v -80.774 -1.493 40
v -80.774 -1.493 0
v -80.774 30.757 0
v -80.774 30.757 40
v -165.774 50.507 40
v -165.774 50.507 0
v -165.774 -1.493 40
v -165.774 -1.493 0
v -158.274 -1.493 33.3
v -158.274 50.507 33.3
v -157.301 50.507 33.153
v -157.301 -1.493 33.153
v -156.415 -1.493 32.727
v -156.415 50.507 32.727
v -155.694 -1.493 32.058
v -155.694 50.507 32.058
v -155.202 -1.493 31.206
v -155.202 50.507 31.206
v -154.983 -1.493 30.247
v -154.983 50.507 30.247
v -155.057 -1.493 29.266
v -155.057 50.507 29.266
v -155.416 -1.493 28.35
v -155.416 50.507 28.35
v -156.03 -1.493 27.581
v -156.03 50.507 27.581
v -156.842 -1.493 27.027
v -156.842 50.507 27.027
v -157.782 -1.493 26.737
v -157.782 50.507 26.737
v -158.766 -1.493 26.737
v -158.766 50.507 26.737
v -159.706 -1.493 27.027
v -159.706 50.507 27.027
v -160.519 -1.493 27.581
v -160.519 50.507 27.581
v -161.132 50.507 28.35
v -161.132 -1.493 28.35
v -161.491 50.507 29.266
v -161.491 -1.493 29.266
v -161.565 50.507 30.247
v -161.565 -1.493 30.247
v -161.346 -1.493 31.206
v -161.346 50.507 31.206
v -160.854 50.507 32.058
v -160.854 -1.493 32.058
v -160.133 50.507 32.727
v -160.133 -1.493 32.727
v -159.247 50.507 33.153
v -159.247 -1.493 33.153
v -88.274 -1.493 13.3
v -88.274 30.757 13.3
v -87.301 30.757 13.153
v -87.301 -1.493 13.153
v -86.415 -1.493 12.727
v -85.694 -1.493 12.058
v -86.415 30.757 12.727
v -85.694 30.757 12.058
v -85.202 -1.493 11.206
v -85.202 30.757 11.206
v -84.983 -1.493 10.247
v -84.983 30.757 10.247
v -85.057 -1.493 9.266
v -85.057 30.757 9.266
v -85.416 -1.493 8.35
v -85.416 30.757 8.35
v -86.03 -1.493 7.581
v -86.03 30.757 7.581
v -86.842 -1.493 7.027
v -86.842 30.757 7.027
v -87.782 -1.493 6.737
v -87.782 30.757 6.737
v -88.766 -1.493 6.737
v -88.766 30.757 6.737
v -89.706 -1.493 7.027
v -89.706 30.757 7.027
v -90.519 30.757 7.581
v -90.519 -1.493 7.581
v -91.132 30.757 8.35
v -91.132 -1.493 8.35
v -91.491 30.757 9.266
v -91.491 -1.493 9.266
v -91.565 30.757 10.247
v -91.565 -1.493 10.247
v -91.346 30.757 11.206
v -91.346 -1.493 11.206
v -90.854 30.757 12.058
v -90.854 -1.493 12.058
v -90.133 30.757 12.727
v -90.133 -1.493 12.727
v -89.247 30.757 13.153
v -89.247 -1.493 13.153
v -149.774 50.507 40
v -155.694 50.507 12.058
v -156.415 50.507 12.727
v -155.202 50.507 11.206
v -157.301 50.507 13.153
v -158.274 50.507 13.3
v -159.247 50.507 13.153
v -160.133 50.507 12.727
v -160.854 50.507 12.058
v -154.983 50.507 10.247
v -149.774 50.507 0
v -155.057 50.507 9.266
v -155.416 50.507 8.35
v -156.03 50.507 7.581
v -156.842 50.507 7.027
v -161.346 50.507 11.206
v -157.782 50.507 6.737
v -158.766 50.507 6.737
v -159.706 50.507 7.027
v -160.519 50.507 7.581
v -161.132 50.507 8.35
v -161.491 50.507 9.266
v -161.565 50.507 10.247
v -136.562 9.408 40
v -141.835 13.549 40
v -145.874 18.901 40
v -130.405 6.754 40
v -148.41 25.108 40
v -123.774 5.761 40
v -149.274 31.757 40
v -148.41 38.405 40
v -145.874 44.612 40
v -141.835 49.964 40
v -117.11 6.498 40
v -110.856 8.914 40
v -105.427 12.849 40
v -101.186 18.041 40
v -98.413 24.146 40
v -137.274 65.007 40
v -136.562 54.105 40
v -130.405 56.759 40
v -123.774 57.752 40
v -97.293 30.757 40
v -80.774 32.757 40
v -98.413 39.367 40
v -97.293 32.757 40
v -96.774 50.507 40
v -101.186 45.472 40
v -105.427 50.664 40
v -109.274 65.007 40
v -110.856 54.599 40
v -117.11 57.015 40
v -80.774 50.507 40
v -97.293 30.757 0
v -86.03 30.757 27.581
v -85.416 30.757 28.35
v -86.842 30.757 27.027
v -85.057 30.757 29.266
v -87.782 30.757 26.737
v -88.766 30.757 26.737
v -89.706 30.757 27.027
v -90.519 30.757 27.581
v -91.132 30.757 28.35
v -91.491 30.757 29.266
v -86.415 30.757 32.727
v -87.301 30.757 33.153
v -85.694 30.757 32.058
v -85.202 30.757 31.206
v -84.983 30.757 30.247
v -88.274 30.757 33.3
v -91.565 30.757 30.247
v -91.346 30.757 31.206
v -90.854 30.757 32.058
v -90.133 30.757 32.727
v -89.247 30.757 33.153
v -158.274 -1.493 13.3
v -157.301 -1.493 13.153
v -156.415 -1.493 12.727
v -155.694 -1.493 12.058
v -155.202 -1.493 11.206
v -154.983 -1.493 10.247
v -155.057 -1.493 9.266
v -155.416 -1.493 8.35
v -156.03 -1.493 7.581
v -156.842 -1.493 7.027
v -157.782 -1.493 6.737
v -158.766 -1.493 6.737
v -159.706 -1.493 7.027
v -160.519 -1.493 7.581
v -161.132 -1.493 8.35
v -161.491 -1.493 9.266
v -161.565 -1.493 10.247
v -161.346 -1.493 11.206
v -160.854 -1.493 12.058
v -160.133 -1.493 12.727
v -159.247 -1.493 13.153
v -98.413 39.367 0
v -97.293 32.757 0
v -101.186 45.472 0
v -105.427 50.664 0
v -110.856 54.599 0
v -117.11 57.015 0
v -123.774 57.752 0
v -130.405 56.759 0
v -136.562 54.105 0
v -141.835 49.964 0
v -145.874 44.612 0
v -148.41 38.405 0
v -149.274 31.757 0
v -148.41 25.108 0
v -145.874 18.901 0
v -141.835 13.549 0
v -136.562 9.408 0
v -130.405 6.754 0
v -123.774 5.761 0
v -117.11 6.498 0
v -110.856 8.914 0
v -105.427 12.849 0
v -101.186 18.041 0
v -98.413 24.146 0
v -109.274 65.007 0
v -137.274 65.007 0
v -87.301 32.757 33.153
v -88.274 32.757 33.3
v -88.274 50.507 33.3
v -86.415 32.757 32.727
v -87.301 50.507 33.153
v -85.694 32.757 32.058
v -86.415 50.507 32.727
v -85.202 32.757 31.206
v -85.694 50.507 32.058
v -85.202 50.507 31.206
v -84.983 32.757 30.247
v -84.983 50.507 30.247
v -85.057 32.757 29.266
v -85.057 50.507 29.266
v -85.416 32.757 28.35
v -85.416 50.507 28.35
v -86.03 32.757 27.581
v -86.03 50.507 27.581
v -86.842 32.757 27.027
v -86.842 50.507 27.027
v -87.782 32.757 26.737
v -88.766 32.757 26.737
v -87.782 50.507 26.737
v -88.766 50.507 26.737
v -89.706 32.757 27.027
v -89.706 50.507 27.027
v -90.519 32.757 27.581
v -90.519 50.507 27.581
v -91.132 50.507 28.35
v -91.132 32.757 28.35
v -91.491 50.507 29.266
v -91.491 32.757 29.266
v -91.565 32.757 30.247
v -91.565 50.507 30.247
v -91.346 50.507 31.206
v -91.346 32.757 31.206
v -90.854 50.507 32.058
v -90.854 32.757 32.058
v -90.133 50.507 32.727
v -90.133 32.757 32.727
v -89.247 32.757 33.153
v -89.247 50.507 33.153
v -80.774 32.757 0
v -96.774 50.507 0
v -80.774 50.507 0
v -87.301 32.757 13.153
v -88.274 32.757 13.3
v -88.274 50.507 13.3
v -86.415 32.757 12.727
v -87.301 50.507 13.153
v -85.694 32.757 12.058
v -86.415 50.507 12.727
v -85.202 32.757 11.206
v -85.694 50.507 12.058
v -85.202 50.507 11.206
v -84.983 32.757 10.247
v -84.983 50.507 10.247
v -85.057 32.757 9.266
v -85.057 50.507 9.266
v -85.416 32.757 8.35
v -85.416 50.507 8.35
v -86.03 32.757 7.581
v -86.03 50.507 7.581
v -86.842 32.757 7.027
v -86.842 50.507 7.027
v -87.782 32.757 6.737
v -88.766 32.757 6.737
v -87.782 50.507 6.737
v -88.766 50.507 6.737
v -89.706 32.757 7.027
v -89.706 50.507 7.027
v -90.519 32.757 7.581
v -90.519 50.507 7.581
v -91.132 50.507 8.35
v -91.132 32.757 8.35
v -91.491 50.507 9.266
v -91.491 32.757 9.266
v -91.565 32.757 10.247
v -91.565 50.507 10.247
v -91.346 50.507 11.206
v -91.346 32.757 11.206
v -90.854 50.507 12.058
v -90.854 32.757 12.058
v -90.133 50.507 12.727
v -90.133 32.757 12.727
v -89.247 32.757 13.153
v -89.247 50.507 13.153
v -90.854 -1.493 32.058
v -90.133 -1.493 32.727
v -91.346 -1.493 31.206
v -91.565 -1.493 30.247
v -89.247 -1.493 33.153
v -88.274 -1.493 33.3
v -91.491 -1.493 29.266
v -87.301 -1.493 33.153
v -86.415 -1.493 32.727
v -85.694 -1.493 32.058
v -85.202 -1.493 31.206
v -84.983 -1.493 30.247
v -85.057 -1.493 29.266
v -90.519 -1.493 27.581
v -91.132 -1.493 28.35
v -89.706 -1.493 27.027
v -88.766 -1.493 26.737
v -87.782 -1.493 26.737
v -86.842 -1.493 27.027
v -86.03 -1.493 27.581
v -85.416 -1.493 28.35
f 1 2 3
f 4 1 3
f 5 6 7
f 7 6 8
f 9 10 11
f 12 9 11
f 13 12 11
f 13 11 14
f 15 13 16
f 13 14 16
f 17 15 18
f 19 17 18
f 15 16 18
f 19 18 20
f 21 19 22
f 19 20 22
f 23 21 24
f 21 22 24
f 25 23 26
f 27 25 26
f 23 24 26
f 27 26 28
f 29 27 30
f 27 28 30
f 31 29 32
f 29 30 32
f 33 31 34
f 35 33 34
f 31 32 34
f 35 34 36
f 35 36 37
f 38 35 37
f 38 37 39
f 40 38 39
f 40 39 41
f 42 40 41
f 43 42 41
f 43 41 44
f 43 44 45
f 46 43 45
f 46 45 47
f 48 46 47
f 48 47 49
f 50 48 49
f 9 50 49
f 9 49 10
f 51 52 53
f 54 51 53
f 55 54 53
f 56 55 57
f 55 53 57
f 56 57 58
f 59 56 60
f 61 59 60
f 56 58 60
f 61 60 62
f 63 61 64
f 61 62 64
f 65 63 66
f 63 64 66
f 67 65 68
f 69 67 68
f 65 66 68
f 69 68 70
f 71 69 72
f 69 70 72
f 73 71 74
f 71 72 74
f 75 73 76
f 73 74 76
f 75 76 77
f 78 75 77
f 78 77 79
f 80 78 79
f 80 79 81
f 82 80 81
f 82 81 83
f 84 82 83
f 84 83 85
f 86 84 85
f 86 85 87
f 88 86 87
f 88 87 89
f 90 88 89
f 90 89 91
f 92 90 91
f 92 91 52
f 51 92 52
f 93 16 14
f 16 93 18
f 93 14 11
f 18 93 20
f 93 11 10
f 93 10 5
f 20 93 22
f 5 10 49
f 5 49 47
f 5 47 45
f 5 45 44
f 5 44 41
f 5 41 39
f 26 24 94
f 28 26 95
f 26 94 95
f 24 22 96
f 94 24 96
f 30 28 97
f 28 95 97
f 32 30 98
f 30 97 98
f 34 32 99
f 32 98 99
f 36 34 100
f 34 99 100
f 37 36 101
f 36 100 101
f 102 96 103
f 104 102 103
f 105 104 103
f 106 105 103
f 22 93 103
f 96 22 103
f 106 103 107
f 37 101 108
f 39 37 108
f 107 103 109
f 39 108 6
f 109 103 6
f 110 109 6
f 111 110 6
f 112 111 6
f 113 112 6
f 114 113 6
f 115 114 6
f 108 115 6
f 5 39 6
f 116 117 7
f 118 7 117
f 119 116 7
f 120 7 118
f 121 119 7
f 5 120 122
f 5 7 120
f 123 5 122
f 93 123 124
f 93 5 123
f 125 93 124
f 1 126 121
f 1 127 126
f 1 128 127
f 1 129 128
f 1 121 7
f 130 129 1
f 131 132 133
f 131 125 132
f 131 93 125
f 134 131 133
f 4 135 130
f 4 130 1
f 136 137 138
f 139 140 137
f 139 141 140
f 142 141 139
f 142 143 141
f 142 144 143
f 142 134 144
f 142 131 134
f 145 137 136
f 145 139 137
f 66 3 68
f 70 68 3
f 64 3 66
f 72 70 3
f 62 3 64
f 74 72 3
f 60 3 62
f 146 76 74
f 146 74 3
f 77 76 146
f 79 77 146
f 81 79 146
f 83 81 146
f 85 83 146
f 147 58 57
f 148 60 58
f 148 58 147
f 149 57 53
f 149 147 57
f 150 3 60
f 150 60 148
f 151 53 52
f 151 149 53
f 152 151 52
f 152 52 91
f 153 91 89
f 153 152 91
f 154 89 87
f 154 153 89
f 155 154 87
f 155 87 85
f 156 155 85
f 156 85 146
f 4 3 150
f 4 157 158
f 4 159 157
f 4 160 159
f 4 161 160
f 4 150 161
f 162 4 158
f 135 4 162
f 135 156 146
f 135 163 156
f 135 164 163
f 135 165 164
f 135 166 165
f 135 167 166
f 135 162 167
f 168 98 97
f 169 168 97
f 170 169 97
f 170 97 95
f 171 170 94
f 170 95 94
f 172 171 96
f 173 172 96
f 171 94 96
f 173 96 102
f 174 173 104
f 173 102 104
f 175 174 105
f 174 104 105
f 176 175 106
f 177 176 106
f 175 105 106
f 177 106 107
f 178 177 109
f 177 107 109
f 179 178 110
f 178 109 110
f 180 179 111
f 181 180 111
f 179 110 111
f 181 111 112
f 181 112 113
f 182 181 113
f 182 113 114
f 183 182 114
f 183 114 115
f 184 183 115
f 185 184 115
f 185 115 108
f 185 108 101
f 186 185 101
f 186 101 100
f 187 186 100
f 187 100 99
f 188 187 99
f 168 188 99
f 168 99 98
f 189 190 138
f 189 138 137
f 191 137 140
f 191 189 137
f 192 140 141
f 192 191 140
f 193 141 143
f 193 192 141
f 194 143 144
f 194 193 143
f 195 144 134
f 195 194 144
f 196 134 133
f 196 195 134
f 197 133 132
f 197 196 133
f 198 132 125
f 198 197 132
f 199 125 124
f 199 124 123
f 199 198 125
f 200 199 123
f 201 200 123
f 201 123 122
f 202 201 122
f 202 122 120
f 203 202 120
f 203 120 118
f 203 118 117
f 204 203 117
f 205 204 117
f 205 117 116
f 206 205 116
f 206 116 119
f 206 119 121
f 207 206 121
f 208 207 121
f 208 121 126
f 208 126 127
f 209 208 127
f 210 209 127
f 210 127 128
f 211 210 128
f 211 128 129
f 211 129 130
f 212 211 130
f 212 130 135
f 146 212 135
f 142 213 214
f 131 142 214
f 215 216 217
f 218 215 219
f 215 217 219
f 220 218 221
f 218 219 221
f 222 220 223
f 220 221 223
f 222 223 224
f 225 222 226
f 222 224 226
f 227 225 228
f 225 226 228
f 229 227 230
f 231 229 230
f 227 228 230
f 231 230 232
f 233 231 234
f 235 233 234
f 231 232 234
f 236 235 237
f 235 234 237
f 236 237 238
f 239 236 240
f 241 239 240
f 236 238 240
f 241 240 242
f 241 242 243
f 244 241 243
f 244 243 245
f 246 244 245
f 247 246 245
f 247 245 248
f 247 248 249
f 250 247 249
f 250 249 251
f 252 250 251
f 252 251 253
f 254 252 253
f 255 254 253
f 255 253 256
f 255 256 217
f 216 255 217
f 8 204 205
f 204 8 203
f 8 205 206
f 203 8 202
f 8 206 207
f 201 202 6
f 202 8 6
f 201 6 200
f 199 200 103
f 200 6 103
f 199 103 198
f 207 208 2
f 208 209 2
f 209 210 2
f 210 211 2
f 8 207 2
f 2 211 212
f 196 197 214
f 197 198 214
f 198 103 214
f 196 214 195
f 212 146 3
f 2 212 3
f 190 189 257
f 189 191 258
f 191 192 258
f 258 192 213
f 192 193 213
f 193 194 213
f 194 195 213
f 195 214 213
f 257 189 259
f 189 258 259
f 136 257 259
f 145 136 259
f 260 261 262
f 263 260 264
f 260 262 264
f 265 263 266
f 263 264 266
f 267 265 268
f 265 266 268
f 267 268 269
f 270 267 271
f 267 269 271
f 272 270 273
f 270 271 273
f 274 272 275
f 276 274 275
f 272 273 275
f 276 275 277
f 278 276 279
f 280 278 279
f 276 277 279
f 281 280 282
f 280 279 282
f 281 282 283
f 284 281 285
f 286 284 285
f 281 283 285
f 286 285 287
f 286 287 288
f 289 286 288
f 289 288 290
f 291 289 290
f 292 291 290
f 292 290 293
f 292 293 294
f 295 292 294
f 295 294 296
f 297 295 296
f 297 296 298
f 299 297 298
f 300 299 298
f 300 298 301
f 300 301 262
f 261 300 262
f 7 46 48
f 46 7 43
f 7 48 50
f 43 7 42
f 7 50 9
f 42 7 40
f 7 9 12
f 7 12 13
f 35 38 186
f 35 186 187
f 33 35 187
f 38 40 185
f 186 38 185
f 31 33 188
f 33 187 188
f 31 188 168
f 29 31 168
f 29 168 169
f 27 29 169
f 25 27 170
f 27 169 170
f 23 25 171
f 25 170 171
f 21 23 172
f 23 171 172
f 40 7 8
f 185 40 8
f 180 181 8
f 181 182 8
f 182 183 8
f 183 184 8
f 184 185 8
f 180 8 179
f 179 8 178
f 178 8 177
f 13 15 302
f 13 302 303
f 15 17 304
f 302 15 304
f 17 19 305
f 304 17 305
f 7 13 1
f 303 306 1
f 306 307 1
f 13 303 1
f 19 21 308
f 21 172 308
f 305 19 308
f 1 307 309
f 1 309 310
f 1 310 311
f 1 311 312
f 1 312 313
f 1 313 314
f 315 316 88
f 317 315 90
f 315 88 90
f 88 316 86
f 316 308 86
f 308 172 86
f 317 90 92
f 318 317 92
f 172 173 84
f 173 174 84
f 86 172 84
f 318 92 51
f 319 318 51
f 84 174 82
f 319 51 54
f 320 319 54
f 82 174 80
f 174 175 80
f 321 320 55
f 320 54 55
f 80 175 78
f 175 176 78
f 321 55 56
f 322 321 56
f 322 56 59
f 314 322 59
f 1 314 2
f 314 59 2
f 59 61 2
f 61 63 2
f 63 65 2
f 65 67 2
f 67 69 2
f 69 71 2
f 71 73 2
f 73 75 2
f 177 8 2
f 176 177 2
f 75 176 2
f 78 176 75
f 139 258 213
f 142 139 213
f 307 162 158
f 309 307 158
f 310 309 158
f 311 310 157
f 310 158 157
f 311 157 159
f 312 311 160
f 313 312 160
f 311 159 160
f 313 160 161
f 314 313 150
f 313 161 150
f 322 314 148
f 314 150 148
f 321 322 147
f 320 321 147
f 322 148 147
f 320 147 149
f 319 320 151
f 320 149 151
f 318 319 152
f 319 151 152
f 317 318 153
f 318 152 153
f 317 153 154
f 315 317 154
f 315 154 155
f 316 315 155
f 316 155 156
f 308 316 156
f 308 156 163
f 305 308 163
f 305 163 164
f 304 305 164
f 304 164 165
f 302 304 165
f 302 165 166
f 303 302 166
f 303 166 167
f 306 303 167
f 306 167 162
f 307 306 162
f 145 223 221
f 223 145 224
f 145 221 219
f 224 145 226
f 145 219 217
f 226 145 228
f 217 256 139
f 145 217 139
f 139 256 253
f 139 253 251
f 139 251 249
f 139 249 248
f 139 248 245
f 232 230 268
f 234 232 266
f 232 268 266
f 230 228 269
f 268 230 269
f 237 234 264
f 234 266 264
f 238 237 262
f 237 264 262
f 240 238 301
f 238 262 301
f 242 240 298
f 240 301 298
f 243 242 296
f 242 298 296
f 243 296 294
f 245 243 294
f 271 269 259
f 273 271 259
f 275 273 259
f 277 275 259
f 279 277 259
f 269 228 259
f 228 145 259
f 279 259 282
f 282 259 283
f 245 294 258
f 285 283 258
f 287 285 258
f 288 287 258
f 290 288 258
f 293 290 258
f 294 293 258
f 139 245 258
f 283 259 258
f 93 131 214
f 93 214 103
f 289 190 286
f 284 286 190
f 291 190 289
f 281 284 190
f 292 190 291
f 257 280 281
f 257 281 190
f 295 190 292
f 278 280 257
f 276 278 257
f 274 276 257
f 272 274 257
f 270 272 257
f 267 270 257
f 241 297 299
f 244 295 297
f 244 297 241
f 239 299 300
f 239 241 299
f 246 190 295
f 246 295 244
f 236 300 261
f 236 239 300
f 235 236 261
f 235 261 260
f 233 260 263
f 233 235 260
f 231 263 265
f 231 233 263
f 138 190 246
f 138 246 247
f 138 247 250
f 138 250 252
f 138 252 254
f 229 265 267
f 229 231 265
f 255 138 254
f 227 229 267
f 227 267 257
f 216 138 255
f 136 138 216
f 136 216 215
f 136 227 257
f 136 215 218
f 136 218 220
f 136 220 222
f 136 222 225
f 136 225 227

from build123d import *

# Parameters (mm, degrees)
ESQUISSE1_R             = 26
BOSS_EXTRU_1_DEPTH      = 40
ENL_V_MAT_EXTRU_1_REACH = 184.502
ESQUISSE3_R             = 3.3
ENL_V_MAT_EXTRU_2_DEPTH = 179.283669838


with BuildPart() as part:
    # Esquisse1 → Boss.-Extru.1 (new body)
    with BuildSketch(Plane.XY):
        Polygon((-165.774144338, -1.493499921), (-80.774144338, -1.493499921), (-80.774144338, 50.506500079), (-96.774144338, 50.506500079), (-109.274144338, 65.006500079), (-137.274144338, 65.006500079), (-149.774144338, 50.506500079), (-165.774144338, 50.506500079), align=None)
        with Locations((-123.274144338, 31.756500079)):
            Circle(ESQUISSE1_R, mode=Mode.SUBTRACT)
    extrude(amount=BOSS_EXTRU_1_DEPTH)

    # Esquisse2 → Enlèv. mat.-Extru.1 (cut, up to next)
    with BuildSketch(Plane.XY.offset(40), mode=Mode.PRIVATE) as enl_v_mat_extru_1_sk1:
        with BuildLine():
            Line((-97.293382224, 32.756500079), (-80.774144338, 32.756500079))
            Line((-80.774144338, 32.756500079), (-80.774144338, 30.756500079))
            Line((-80.774144338, 30.756500079), (-97.293382224, 30.756500079))
            ThreePointArc((-97.293382224, 30.756500079), (-97.274144338, 31.756500079), (-97.293382224, 32.756500079))
        make_face()
    enl_v_mat_extru_1_tool1 = extrude(enl_v_mat_extru_1_sk1.sketch, amount=-ENL_V_MAT_EXTRU_1_REACH, mode=Mode.PRIVATE) & part.part
    add(enl_v_mat_extru_1_tool1.solids().sort_by_distance((-89.027351, 31.7565, 40))[0], mode=Mode.SUBTRACT)

    # Esquisse3 → Enlèv. mat.-Extru.2 (cut, through all)
    with BuildSketch(Plane(origin=(0, 50.506500079, 0), x_dir=(1, 0, 0), z_dir=(0, 1, 0))):
        with Locations(Location((-158.274144338, -10, 0), (0, 0, 270))):
            Circle(ESQUISSE3_R)
        with Locations(Location((-158.274144338, -30, 0), (0, 0, 270))):
            Circle(ESQUISSE3_R)
        with Locations(Location((-88.274144338, -10, 0), (0, 0, 270))):
            Circle(ESQUISSE3_R)
        with Locations(Location((-88.274144338, -30, 0), (0, 0, 270))):
            Circle(ESQUISSE3_R)
    extrude(amount=-ENL_V_MAT_EXTRU_2_DEPTH, mode=Mode.SUBTRACT)


solid = part.part
